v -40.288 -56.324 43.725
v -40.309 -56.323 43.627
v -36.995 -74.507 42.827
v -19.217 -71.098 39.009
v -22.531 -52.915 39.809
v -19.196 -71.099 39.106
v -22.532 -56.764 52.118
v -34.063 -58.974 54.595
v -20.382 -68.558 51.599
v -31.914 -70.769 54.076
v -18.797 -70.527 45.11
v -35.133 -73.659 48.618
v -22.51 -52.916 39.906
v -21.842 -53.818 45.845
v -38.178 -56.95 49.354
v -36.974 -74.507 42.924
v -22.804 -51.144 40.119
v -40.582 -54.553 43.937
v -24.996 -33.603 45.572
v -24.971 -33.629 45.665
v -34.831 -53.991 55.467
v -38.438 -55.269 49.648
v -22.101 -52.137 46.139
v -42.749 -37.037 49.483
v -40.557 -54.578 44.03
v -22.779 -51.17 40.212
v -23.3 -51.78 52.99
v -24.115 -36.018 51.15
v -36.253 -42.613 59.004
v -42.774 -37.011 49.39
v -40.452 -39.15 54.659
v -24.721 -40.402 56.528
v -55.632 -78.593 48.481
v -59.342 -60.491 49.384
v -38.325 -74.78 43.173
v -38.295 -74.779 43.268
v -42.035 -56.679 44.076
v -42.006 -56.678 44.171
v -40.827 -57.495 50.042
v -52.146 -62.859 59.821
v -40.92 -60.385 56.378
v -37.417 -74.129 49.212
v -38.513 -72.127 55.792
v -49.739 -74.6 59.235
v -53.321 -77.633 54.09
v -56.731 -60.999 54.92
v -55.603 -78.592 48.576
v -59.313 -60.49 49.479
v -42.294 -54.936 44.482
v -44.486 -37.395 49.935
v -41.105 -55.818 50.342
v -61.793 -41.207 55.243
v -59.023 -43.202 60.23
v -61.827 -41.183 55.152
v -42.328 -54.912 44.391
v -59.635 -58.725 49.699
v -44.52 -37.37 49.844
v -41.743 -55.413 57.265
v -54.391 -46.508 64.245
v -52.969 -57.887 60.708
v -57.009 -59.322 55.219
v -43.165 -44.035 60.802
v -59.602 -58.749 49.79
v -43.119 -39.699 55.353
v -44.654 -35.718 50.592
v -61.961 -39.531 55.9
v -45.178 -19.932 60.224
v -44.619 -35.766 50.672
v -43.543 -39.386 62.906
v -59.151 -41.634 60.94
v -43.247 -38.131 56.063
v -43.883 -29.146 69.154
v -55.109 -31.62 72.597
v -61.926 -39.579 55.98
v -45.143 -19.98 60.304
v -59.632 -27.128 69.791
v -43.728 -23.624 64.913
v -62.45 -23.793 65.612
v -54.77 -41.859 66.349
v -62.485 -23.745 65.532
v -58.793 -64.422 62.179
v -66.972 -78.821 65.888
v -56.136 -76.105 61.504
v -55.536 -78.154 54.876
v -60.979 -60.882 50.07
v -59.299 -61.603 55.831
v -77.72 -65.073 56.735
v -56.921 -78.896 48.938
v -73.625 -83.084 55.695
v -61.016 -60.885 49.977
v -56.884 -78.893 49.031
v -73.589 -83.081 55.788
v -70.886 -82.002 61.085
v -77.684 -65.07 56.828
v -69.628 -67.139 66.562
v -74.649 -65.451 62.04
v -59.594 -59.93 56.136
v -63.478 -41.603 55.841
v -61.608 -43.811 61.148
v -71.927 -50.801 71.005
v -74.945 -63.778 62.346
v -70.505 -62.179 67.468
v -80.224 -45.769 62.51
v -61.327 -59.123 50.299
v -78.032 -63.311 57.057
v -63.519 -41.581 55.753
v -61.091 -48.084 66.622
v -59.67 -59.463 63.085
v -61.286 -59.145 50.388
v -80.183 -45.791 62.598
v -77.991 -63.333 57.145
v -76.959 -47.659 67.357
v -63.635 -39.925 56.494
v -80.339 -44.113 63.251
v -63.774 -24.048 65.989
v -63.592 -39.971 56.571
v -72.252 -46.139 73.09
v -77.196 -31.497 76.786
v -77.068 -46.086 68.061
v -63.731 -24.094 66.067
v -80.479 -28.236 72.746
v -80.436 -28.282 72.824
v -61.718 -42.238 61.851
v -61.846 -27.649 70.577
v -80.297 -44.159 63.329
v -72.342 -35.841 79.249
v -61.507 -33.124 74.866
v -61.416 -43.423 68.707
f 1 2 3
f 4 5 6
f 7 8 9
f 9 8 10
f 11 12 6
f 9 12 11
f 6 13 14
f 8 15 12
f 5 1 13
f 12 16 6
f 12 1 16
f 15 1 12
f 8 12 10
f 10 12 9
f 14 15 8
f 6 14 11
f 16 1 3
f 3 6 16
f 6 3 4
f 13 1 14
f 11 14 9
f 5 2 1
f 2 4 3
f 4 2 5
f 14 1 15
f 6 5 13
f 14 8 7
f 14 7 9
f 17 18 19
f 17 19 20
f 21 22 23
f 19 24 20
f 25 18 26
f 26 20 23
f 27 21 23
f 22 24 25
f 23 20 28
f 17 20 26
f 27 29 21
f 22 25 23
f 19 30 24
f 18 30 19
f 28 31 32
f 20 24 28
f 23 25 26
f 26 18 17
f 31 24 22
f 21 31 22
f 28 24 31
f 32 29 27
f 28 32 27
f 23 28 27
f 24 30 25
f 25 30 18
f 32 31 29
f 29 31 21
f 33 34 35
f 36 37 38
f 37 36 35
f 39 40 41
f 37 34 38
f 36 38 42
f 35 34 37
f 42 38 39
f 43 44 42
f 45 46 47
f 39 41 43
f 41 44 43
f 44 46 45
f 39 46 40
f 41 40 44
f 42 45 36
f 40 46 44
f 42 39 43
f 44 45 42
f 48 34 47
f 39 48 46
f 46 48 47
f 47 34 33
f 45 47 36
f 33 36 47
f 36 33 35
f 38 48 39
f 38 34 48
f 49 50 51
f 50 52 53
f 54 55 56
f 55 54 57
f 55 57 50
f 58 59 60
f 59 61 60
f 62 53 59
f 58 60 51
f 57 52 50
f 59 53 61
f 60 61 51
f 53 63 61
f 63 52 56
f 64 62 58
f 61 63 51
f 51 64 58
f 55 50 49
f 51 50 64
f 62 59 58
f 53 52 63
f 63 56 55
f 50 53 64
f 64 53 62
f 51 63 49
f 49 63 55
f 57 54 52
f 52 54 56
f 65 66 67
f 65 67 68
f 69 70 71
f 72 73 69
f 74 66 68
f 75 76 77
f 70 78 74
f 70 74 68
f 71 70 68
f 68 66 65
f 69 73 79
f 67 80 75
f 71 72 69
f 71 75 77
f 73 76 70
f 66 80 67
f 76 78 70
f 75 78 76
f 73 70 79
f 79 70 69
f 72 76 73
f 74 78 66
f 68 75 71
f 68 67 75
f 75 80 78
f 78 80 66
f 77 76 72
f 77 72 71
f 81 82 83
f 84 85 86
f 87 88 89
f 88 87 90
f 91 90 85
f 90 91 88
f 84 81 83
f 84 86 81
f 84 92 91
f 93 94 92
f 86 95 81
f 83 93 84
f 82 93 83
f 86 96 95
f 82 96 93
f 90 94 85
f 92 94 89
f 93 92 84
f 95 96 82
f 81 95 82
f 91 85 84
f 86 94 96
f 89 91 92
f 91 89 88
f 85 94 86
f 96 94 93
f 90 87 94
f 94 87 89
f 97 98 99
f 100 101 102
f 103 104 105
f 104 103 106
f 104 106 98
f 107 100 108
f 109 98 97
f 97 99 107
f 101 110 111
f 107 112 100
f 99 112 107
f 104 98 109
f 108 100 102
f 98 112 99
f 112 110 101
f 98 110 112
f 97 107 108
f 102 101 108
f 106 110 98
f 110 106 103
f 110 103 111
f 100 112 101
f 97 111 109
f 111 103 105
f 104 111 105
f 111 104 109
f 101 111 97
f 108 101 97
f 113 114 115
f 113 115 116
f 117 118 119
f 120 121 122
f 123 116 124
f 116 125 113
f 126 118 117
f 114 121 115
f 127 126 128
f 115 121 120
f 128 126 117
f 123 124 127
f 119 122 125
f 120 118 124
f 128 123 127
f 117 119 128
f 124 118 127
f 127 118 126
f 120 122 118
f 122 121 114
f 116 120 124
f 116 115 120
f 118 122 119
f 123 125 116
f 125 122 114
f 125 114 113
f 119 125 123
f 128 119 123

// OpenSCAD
union () {
  union () {
    translate ([-52, -45, 40]) {
      rotate (a=14.999999999999998, v=[0, 1, 0]) {
        rotate (a=14.999999999999998, v=[1, 0, 0]) {
          rotate (a=10.995574287564276, v=[0, 0, 1]) {
            translate ([17.65, 0, 0]) {
              translate ([0, 0, 241.94387877597407]) {
                rotate (a=0.0, v=[0, 1, 0]) {
                  translate ([0, 0, -241.94387877597407]) {
                    translate ([0, 0, 86.22627549802904]) {
                      rotate (a=-14.999999999999998, v=[1, 0, 0]) {
                        translate ([0, 0, -86.22627549802904]) {
                          color ([44/51, 163/255, 163/255, 1]) {
                            translate ([0, 0, 9]) {
                              hull () {
                                translate ([0, 0, 0.05]) {
                                  linear_extrude (height=0.1, twist=0.0, convexity=0, center=true){
                                    polygon (points=[[9.25, 9.25], [9.25, -9.25], [-9.25, -9.25], [-9.25, 9.25]]);
                                  }
                                }
                                translate ([0, 0, 6]) {
                                  linear_extrude (height=0.1, twist=0.0, convexity=0, center=true){
                                    polygon (points=[[17/2, 17/2], [17/2, -17/2], [-17/2, -17/2], [-17/2, 17/2]]);
                                  }
                                }
                                translate ([0, 0, 12]) {
                                  linear_extrude (height=0.1, twist=0.0, convexity=0, center=true){
                                    polygon (points=[[6, 6], [6, -6], [-6, -6], [-6, 6]]);
                                  }
                                }
                              }
                            }
                          }
                        }
                      }
                    }
                  }
                }
              }
            }
          }
        }
      }
    }
    translate ([-52, -45, 40]) {
      rotate (a=14.999999999999998, v=[0, 1, 0]) {
        rotate (a=14.999999999999998, v=[1, 0, 0]) {
          rotate (a=10.995574287564276, v=[0, 0, 1]) {
            translate ([17.65, 0, 0]) {
              translate ([0, 0, 241.94387877597407]) {
                rotate (a=0.0, v=[0, 1, 0]) {
                  translate ([0, 0, -241.94387877597407]) {
                    translate ([0, 0, 86.22627549802904]) {
                      rotate (a=0.0, v=[1, 0, 0]) {
                        translate ([0, 0, -86.22627549802904]) {
                          color ([44/51, 163/255, 163/255, 1]) {
                            translate ([0, 0, 9]) {
                              hull () {
                                translate ([0, 0, 0.05]) {
                                  linear_extrude (height=0.1, twist=0.0, convexity=0, center=true){
                                    polygon (points=[[9.25, 9.25], [9.25, -9.25], [-9.25, -9.25], [-9.25, 9.25]]);
                                  }
                                }
                                translate ([0, 0, 6]) {
                                  linear_extrude (height=0.1, twist=0.0, convexity=0, center=true){
                                    polygon (points=[[17/2, 17/2], [17/2, -17/2], [-17/2, -17/2], [-17/2, 17/2]]);
                                  }
                                }
                                translate ([0, 0, 12]) {
                                  linear_extrude (height=0.1, twist=0.0, convexity=0, center=true){
                                    polygon (points=[[6, 6], [6, -6], [-6, -6], [-6, 6]]);
                                  }
                                }
                              }
                            }
                          }
                        }
                      }
                    }
                  }
                }
              }
            }
          }
        }
      }
    }
  }
  union () {
    translate ([-52, -45, 40]) {
      rotate (a=14.999999999999998, v=[0, 1, 0]) {
        rotate (a=14.999999999999998, v=[1, 0, 0]) {
          rotate (a=10.995574287564276, v=[0, 0, 1]) {
            translate ([17.65, 0, 0]) {
              translate ([0, 0, 241.94387877597407]) {
                rotate (a=5.000000000000001, v=[0, 1, 0]) {
                  translate ([0, 0, -241.94387877597407]) {
                    translate ([0, 0, 86.22627549802904]) {
                      rotate (a=-14.999999999999998, v=[1, 0, 0]) {
                        translate ([0, 0, -86.22627549802904]) {
                          color ([44/51, 163/255, 163/255, 1]) {
                            translate ([0, 0, 9]) {
                              hull () {
                                translate ([0, 0, 0.05]) {
                                  linear_extrude (height=0.1, twist=0.0, convexity=0, center=true){
                                    polygon (points=[[9.25, 9.25], [9.25, -9.25], [-9.25, -9.25], [-9.25, 9.25]]);
                                  }
                                }
                                translate ([0, 0, 6]) {
                                  linear_extrude (height=0.1, twist=0.0, convexity=0, center=true){
                                    polygon (points=[[17/2, 17/2], [17/2, -17/2], [-17/2, -17/2], [-17/2, 17/2]]);
                                  }
                                }
                                translate ([0, 0, 12]) {
                                  linear_extrude (height=0.1, twist=0.0, convexity=0, center=true){
                                    polygon (points=[[6, 6], [6, -6], [-6, -6], [-6, 6]]);
                                  }
                                }
                              }
                            }
                          }
                        }
                      }
                    }
                  }
                }
              }
            }
          }
        }
      }
    }
    translate ([-52, -45, 40]) {
      rotate (a=14.999999999999998, v=[0, 1, 0]) {
        rotate (a=14.999999999999998, v=[1, 0, 0]) {
          rotate (a=10.995574287564276, v=[0, 0, 1]) {
            translate ([17.65, 0, 0]) {
              translate ([0, 0, 241.94387877597407]) {
                rotate (a=5.000000000000001, v=[0, 1, 0]) {
                  translate ([0, 0, -241.94387877597407]) {
                    translate ([0, 0, 86.22627549802904]) {
                      rotate (a=0.0, v=[1, 0, 0]) {
                        translate ([0, 0, -86.22627549802904]) {
                          color ([44/51, 163/255, 163/255, 1]) {
                            translate ([0, 0, 9]) {
                              hull () {
                                translate ([0, 0, 0.05]) {
                                  linear_extrude (height=0.1, twist=0.0, convexity=0, center=true){
                                    polygon (points=[[9.25, 9.25], [9.25, -9.25], [-9.25, -9.25], [-9.25, 9.25]]);
                                  }
                                }
                                translate ([0, 0, 6]) {
                                  linear_extrude (height=0.1, twist=0.0, convexity=0, center=true){
                                    polygon (points=[[17/2, 17/2], [17/2, -17/2], [-17/2, -17/2], [-17/2, 17/2]]);
                                  }
                                }
                                translate ([0, 0, 12]) {
                                  linear_extrude (height=0.1, twist=0.0, convexity=0, center=true){
                                    polygon (points=[[6, 6], [6, -6], [-6, -6], [-6, 6]]);
                                  }
                                }
                              }
                            }
                          }
                        }
                      }
                    }
                  }
                }
              }
            }
          }
        }
      }
    }
    translate ([-52, -45, 40]) {
      rotate (a=14.999999999999998, v=[0, 1, 0]) {
        rotate (a=14.999999999999998, v=[1, 0, 0]) {
          rotate (a=10.995574287564276, v=[0, 0, 1]) {
            translate ([17.65, 0, 0]) {
              translate ([0, 0, 241.94387877597407]) {
                rotate (a=5.000000000000001, v=[0, 1, 0]) {
                  translate ([0, 0, -241.94387877597407]) {
                    translate ([0, 0, 86.22627549802904]) {
                      rotate (a=14.999999999999998, v=[1, 0, 0]) {
                        translate ([0, 0, -86.22627549802904]) {
                          color ([44/51, 163/255, 163/255, 1]) {
                            translate ([0, 0, 9]) {
                              hull () {
                                translate ([0, 0, 0.05]) {
                                  linear_extrude (height=0.1, twist=0.0, convexity=0, center=true){
                                    polygon (points=[[9.25, 9.25], [9.25, -9.25], [-9.25, -9.25], [-9.25, 9.25]]);
                                  }
                                }
                                translate ([0, 0, 6]) {
                                  linear_extrude (height=0.1, twist=0.0, convexity=0, center=true){
                                    polygon (points=[[17/2, 17/2], [17/2, -17/2], [-17/2, -17/2], [-17/2, 17/2]]);
                                  }
                                }
                                translate ([0, 0, 12]) {
                                  linear_extrude (height=0.1, twist=0.0, convexity=0, center=true){
                                    polygon (points=[[6, 6], [6, -6], [-6, -6], [-6, 6]]);
                                  }
                                }
                              }
                            }
                          }
                        }
                      }
                    }
                  }
                }
              }
            }
          }
        }
      }
    }
  }
  union () {
    translate ([-52, -45, 40]) {
      rotate (a=14.999999999999998, v=[0, 1, 0]) {
        rotate (a=14.999999999999998, v=[1, 0, 0]) {
          rotate (a=10.995574287564276, v=[0, 0, 1]) {
            translate ([17.65, 0, 0]) {
              translate ([0, 0, 241.94387877597407]) {
                rotate (a=10.000000000000002, v=[0, 1, 0]) {
                  translate ([0, 0, -241.94387877597407]) {
                    translate ([0, 0, 86.22627549802904]) {
                      rotate (a=-14.999999999999998, v=[1, 0, 0]) {
                        translate ([0, 0, -86.22627549802904]) {
                          color ([44/51, 163/255, 163/255, 1]) {
                            translate ([0, 0, 9]) {
                              hull () {
                                translate ([0, 0, 0.05]) {
                                  linear_extrude (height=0.1, twist=0.0, convexity=0, center=true){
                                    polygon (points=[[9.25, 9.25], [9.25, -9.25], [-9.25, -9.25], [-9.25, 9.25]]);
                                  }
                                }
                                translate ([0, 0, 6]) {
                                  linear_extrude (height=0.1, twist=0.0, convexity=0, center=true){
                                    polygon (points=[[17/2, 17/2], [17/2, -17/2], [-17/2, -17/2], [-17/2, 17/2]]);
                                  }
                                }
                                translate ([0, 0, 12]) {
                                  linear_extrude (height=0.1, twist=0.0, convexity=0, center=true){
                                    polygon (points=[[6, 6], [6, -6], [-6, -6], [-6, 6]]);
                                  }
                                }
                              }
                            }
                          }
                        }
                      }
                    }
                  }
                }
              }
            }
          }
        }
      }
    }
    translate ([-52, -45, 40]) {
      rotate (a=14.999999999999998, v=[0, 1, 0]) {
        rotate (a=14.999999999999998, v=[1, 0, 0]) {
          rotate (a=10.995574287564276, v=[0, 0, 1]) {
            translate ([17.65, 0, 0]) {
              translate ([0, 0, 241.94387877597407]) {
                rotate (a=10.000000000000002, v=[0, 1, 0]) {
                  translate ([0, 0, -241.94387877597407]) {
                    translate ([0, 0, 86.22627549802904]) {
                      rotate (a=0.0, v=[1, 0, 0]) {
                        translate ([0, 0, -86.22627549802904]) {
                          color ([44/51, 163/255, 163/255, 1]) {
                            translate ([0, 0, 9]) {
                              hull () {
                                translate ([0, 0, 0.05]) {
                                  linear_extrude (height=0.1, twist=0.0, convexity=0, center=true){
                                    polygon (points=[[9.25, 9.25], [9.25, -9.25], [-9.25, -9.25], [-9.25, 9.25]]);
                                  }
                                }
                                translate ([0, 0, 6]) {
                                  linear_extrude (height=0.1, twist=0.0, convexity=0, center=true){
                                    polygon (points=[[17/2, 17/2], [17/2, -17/2], [-17/2, -17/2], [-17/2, 17/2]]);
                                  }
                                }
                                translate ([0, 0, 12]) {
                                  linear_extrude (height=0.1, twist=0.0, convexity=0, center=true){
                                    polygon (points=[[6, 6], [6, -6], [-6, -6], [-6, 6]]);
                                  }
                                }
                              }
                            }
                          }
                        }
                      }
                    }
                  }
                }
              }
            }
          }
        }
      }
    }
    translate ([-52, -45, 40]) {
      rotate (a=14.999999999999998, v=[0, 1, 0]) {
        rotate (a=14.999999999999998, v=[1, 0, 0]) {
          rotate (a=10.995574287564276, v=[0, 0, 1]) {
            translate ([17.65, 0, 0]) {
              translate ([0, 0, 241.94387877597407]) {
                rotate (a=10.000000000000002, v=[0, 1, 0]) {
                  translate ([0, 0, -241.94387877597407]) {
                    translate ([0, 0, 86.22627549802904]) {
                      rotate (a=14.999999999999998, v=[1, 0, 0]) {
                        translate ([0, 0, -86.22627549802904]) {
                          color ([44/51, 163/255, 163/255, 1]) {
                            translate ([0, 0, 9]) {
                              hull () {
                                translate ([0, 0, 0.05]) {
                                  linear_extrude (height=0.1, twist=0.0, convexity=0, center=true){
                                    polygon (points=[[9.25, 9.25], [9.25, -9.25], [-9.25, -9.25], [-9.25, 9.25]]);
                                  }
                                }
                                translate ([0, 0, 6]) {
                                  linear_extrude (height=0.1, twist=0.0, convexity=0, center=true){
                                    polygon (points=[[17/2, 17/2], [17/2, -17/2], [-17/2, -17/2], [-17/2, 17/2]]);
                                  }
                                }
                                translate ([0, 0, 12]) {
                                  linear_extrude (height=0.1, twist=0.0, convexity=0, center=true){
                                    polygon (points=[[6, 6], [6, -6], [-6, -6], [-6, 6]]);
                                  }
                                }
                              }
                            }
                          }
                        }
                      }
                    }
                  }
                }
              }
            }
          }
        }
      }
    }
  }
}
